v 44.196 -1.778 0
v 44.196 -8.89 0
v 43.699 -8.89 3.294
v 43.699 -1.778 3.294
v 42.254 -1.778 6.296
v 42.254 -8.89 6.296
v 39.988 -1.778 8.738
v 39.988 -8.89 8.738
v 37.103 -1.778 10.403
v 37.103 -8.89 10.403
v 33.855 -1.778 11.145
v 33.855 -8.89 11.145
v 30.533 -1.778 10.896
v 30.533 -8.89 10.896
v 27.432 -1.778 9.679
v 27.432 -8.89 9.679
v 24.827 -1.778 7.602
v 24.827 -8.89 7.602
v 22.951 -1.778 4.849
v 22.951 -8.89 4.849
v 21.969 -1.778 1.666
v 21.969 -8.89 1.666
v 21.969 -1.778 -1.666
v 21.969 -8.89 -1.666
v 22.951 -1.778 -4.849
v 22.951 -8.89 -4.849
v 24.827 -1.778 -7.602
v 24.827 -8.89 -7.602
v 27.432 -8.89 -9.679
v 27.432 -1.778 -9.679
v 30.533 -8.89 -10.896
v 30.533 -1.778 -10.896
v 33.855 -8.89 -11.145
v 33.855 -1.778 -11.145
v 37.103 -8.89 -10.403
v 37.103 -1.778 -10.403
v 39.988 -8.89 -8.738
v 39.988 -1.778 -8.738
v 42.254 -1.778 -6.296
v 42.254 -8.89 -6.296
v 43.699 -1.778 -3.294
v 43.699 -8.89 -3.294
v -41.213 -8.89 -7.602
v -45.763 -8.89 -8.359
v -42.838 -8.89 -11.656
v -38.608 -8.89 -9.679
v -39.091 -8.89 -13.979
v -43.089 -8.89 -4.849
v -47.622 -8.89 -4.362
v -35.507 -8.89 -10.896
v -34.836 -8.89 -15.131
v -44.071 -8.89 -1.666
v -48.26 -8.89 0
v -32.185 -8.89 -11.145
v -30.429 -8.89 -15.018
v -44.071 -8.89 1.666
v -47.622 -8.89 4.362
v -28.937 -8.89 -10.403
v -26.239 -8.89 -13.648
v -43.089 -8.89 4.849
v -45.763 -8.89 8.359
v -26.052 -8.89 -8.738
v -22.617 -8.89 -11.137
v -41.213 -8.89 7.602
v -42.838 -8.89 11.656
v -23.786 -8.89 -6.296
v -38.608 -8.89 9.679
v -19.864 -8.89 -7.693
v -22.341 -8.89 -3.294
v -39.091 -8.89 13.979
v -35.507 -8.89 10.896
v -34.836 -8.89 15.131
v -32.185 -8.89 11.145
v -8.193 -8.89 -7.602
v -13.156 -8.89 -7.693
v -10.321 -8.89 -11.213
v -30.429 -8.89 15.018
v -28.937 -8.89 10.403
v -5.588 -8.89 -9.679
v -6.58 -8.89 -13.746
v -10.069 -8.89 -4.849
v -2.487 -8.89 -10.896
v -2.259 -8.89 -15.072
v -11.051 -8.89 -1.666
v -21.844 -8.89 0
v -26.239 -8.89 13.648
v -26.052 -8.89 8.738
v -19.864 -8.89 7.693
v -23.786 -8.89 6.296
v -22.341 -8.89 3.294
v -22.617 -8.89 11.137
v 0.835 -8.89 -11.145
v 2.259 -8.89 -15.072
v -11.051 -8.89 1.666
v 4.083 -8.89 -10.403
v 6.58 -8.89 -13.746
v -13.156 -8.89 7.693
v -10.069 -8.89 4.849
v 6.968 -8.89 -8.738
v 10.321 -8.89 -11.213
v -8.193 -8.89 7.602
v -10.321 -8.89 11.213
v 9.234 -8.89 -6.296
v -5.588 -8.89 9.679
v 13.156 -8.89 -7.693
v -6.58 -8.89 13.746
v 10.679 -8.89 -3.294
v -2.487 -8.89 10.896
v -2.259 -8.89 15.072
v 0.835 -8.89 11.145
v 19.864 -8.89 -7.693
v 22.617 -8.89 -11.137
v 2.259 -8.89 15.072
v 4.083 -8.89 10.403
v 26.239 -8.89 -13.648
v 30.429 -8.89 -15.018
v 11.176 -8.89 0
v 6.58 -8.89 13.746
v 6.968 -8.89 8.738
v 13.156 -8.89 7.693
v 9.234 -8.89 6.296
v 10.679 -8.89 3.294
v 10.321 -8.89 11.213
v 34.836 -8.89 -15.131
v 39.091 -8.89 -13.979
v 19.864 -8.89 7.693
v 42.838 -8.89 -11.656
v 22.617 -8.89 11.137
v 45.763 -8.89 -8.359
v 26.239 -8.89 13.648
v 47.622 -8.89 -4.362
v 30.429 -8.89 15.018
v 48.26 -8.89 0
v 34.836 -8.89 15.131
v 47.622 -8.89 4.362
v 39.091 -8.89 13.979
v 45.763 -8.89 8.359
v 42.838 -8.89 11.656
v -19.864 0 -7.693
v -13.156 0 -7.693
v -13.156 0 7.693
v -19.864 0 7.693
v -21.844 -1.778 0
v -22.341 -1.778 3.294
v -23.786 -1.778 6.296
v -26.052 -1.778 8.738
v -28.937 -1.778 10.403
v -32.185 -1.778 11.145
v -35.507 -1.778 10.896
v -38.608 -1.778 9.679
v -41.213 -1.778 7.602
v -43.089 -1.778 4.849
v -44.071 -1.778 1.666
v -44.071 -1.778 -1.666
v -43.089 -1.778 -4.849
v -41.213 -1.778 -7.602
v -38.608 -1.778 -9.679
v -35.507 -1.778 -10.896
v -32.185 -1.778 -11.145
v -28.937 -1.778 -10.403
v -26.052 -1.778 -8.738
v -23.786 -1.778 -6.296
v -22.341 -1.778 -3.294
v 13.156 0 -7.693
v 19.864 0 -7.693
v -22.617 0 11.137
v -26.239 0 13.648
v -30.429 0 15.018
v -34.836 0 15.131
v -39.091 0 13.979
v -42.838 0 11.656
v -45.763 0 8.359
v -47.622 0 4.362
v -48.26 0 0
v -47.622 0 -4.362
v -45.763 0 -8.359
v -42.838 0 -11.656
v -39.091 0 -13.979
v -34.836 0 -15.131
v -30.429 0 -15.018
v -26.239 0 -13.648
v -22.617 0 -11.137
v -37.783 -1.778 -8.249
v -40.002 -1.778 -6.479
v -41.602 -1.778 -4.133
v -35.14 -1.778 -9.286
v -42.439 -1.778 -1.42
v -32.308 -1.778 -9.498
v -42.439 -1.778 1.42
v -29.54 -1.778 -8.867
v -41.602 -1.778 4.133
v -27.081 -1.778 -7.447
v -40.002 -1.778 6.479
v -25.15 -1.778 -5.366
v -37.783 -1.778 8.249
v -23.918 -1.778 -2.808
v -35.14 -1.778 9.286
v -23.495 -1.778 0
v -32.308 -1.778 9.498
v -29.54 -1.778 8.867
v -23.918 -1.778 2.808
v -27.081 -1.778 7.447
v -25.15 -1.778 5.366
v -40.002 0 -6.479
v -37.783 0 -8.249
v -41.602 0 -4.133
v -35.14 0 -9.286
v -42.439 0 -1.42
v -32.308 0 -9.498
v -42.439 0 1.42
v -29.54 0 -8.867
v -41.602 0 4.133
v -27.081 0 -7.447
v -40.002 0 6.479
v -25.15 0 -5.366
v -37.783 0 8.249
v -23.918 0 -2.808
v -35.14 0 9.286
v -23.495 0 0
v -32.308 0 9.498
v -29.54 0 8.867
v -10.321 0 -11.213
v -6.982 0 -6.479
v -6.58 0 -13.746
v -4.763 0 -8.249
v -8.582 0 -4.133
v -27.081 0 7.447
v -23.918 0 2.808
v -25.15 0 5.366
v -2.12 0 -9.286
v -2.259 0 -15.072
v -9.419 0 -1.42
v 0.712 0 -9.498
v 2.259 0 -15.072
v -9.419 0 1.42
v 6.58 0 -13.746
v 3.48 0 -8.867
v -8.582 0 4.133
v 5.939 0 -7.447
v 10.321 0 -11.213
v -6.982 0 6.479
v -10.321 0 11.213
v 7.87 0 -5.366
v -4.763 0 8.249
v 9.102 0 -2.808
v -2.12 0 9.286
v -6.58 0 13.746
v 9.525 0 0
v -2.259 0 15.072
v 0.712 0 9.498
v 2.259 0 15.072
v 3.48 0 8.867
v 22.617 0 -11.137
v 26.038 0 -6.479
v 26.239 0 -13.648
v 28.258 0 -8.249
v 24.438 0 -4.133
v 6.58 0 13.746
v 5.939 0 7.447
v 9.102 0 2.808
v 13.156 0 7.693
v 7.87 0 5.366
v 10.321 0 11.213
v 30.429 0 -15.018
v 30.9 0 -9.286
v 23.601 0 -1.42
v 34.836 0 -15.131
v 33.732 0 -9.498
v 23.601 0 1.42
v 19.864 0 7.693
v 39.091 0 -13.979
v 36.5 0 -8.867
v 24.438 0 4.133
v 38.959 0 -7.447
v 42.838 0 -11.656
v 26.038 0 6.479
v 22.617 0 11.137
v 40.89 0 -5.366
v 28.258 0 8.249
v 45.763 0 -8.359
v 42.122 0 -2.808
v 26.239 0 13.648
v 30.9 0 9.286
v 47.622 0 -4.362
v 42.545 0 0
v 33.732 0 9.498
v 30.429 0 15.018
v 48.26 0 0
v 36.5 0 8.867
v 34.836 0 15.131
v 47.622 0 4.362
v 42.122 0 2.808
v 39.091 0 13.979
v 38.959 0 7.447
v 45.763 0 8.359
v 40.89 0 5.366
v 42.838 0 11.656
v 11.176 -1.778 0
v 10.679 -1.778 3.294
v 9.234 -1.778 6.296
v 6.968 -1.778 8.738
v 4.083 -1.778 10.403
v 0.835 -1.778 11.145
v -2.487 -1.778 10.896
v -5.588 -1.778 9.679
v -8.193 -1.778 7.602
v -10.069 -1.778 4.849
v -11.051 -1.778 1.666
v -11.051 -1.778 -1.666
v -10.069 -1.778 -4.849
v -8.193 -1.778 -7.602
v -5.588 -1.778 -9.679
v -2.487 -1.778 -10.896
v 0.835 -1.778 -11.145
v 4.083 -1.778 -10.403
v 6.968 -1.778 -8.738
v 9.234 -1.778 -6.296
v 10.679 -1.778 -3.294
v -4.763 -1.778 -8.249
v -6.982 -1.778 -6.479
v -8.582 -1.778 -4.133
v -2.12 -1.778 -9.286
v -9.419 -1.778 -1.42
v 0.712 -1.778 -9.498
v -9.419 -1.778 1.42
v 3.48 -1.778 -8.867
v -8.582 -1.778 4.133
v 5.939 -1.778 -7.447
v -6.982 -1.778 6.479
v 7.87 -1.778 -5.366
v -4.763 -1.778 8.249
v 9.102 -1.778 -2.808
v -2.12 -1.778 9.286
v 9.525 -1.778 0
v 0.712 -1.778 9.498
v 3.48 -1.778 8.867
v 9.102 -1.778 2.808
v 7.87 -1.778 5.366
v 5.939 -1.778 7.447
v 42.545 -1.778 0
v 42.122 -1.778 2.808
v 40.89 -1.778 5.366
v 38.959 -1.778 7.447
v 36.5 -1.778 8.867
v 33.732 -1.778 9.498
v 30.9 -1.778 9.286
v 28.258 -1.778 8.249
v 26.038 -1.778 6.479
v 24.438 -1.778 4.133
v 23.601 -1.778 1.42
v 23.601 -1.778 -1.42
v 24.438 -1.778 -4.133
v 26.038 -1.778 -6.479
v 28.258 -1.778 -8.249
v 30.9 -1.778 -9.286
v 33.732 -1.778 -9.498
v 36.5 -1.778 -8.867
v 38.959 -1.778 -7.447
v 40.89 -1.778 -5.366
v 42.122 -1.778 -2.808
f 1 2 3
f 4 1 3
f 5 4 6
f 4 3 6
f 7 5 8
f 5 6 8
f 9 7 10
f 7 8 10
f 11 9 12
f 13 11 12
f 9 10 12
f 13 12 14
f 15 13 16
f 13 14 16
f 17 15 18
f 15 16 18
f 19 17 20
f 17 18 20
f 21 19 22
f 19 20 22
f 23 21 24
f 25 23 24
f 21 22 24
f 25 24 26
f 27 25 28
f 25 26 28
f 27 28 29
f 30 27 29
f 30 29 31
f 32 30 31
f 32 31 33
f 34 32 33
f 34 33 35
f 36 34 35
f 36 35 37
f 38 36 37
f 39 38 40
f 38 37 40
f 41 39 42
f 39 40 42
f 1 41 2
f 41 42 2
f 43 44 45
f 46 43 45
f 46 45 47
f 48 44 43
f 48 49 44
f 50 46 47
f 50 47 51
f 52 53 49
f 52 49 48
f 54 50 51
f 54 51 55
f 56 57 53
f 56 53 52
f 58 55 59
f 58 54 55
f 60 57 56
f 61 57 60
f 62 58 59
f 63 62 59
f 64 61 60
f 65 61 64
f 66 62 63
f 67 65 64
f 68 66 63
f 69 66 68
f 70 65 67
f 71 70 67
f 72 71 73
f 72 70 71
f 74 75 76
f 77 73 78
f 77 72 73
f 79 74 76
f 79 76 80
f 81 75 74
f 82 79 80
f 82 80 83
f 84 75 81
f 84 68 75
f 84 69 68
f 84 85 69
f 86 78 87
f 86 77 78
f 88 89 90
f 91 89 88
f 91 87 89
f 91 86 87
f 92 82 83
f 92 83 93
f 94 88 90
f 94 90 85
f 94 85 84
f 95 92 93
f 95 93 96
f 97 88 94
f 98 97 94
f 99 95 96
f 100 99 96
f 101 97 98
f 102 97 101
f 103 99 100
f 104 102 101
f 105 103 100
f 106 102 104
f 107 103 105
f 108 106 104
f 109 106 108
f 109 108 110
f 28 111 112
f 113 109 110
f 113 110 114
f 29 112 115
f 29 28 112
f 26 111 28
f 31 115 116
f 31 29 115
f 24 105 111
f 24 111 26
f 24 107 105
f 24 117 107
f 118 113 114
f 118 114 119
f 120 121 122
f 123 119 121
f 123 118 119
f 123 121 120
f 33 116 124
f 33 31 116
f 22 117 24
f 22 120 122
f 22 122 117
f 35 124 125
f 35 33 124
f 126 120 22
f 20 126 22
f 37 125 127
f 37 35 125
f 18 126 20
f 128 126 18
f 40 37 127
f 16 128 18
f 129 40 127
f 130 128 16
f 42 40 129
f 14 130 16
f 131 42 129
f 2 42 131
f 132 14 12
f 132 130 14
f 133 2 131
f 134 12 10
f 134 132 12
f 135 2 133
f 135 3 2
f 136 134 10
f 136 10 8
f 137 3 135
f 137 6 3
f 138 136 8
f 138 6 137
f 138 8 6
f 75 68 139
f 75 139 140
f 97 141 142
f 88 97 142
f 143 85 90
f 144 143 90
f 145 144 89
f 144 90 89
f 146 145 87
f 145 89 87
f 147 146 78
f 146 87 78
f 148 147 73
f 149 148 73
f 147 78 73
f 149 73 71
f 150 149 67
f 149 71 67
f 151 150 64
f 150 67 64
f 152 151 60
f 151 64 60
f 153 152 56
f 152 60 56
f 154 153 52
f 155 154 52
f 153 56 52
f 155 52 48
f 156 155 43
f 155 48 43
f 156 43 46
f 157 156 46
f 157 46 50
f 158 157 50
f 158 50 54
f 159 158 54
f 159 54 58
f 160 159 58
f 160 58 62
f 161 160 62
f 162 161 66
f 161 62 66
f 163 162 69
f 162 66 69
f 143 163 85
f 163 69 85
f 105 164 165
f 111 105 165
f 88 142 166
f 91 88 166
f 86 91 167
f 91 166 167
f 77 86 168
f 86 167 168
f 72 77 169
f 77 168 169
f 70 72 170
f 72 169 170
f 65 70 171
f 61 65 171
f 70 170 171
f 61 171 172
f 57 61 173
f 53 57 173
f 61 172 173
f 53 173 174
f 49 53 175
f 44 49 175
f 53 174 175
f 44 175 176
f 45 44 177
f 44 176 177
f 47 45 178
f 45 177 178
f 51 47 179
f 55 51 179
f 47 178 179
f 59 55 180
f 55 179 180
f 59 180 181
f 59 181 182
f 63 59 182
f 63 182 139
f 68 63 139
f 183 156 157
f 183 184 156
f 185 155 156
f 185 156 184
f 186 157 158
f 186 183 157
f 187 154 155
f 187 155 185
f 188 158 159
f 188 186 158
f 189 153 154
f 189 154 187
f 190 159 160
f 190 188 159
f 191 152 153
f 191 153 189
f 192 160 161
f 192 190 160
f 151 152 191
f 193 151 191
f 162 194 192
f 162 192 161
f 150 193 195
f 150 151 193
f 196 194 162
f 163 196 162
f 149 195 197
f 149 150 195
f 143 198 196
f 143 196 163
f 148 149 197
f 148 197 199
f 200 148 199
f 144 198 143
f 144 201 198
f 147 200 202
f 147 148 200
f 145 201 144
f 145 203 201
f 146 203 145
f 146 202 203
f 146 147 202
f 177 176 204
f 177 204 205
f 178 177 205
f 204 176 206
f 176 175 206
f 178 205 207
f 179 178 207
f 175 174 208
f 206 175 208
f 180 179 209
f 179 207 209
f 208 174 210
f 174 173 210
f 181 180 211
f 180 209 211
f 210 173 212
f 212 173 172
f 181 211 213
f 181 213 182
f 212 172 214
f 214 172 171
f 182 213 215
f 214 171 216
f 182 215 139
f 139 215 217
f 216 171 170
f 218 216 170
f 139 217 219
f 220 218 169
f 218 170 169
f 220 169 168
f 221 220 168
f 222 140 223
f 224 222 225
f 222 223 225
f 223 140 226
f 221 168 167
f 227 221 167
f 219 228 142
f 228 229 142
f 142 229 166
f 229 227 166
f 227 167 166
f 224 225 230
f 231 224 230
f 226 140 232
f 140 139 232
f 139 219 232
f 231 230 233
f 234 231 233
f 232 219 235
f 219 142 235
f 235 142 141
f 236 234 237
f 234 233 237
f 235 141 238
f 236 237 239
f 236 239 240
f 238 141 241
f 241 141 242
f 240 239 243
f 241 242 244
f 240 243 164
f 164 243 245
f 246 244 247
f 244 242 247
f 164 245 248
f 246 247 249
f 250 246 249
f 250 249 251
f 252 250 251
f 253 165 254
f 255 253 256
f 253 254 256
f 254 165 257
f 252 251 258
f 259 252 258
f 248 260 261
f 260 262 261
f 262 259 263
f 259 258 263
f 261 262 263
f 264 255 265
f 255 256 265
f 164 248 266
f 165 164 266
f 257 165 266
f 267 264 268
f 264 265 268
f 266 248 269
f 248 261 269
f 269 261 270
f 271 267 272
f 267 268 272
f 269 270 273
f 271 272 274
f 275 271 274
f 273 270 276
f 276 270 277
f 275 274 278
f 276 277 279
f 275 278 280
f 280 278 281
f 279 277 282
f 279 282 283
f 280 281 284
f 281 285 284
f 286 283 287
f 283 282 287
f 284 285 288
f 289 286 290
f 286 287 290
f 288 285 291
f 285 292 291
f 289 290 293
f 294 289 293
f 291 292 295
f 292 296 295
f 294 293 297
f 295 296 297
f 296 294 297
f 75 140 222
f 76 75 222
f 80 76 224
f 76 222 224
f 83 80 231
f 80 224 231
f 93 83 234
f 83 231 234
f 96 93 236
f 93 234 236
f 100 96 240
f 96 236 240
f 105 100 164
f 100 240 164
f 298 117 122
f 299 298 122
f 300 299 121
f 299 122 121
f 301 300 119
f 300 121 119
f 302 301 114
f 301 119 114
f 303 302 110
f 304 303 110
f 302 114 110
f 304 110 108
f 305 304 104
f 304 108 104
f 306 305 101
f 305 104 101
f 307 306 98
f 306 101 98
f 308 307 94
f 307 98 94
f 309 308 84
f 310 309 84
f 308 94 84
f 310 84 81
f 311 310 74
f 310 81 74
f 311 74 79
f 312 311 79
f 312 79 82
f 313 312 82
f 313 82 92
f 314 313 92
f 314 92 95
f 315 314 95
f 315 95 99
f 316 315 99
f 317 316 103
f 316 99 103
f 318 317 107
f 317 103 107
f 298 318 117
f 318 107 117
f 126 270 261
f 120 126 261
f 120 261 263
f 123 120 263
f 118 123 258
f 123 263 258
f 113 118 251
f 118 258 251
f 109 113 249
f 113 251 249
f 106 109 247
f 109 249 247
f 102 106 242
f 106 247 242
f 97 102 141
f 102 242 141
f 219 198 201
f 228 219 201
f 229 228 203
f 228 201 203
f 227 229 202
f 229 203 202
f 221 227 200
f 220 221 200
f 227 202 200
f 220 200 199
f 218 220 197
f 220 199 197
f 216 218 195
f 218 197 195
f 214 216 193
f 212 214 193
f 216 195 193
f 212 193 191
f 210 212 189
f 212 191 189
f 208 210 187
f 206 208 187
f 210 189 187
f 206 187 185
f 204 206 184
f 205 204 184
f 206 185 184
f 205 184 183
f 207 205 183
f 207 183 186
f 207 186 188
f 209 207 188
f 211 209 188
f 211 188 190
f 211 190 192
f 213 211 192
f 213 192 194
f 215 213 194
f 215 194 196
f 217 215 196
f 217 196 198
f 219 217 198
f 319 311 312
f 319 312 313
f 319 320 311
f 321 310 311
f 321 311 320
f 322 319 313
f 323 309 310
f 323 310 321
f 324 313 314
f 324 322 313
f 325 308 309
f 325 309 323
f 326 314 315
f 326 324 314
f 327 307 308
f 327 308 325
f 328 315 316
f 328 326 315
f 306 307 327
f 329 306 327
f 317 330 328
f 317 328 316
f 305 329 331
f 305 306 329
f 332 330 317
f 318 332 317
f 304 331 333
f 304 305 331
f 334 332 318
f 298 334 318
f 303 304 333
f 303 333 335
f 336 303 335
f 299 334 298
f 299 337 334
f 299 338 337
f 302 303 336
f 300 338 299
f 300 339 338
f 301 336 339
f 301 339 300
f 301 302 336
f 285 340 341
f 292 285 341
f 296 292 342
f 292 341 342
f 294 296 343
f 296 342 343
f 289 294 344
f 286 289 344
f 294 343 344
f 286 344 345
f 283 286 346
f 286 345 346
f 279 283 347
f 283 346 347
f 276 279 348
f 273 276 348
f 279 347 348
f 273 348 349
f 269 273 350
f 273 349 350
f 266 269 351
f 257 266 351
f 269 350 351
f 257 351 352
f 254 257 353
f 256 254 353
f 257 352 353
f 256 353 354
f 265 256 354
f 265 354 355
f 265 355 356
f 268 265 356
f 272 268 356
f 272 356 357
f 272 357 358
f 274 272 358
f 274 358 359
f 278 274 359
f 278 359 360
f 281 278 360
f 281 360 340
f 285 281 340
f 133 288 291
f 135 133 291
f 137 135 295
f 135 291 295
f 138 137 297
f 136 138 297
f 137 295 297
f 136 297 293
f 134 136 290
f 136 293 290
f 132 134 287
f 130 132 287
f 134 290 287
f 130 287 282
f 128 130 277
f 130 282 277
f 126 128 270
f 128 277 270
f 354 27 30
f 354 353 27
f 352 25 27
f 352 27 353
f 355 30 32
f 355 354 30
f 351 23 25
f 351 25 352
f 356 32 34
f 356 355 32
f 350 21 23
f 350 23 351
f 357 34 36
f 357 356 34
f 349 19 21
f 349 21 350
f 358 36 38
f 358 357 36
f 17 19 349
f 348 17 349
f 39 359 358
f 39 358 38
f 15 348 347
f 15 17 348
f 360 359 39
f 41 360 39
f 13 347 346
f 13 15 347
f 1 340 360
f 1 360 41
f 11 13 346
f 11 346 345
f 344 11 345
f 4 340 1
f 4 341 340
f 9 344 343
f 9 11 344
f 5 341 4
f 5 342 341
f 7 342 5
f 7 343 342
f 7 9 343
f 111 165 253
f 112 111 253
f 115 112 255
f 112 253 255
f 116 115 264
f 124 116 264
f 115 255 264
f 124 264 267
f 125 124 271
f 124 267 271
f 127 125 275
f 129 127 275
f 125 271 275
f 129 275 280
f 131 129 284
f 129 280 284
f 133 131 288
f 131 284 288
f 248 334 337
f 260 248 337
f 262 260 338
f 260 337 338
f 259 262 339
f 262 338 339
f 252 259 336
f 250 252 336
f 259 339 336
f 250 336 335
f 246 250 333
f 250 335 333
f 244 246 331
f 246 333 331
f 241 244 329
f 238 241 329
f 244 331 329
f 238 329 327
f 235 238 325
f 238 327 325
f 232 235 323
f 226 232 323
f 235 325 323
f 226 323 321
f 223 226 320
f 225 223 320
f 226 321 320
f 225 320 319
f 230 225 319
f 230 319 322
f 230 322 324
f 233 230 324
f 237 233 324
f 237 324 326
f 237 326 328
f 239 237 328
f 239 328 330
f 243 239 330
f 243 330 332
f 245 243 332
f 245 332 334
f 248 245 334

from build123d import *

# Parameters (mm, degrees)
F1_DEPTH = 8.89
F2_R     = 9.525
F3_DEPTH = 9.144
F4_R     = 11.176
F5_DEPTH = 7.112


with BuildPart() as f1:
    # F0 (on Front) → F1 (new body)
    with BuildSketch(Plane.XZ):
        with BuildLine():
            Line((33.02, 7.69326929), (33.02, -7.69326929))
            Line((33.02, -7.69326929), (19.8643469326, -7.69326929))
            ThreePointArc((19.8643469326, -7.69326929), (37.0053134916, -14.7096864812), (48.26, 0))
            ThreePointArc((48.26, 0), (37.0053134916, 14.7096864812), (19.8643469326, 7.69326929))
            Line((19.8643469326, 7.69326929), (33.02, 7.69326929))
        make_face()
        with BuildLine():
            Line((19.8643469326, -7.69326929), (33.02, -7.69326929))
            Line((33.02, -7.69326929), (33.02, 7.69326929))
            Line((33.02, 7.69326929), (19.8643469326, 7.69326929))
            ThreePointArc((19.8643469326, 7.69326929), (17.78, 0), (19.8643469326, -7.69326929))
        make_face()
        with BuildLine():
            Line((13.1556530674, -7.69326929), (19.8643469326, -7.69326929))
            ThreePointArc((19.8643469326, -7.69326929), (17.78, 0), (19.8643469326, 7.69326929))
            Line((19.8643469326, 7.69326929), (13.1556530674, 7.69326929))
            ThreePointArc((13.1556530674, 7.69326929), (14.7096864812, 3.9853134916), (15.24, 0))
            ThreePointArc((15.24, 0), (14.7096864812, -3.9853134916), (13.1556530674, -7.69326929))
        make_face()
        with BuildLine():
            ThreePointArc((-13.1556530674, -7.69326929), (0, -15.24), (13.1556530674, -7.69326929))
            Line((13.1556530674, -7.69326929), (-13.1556530674, -7.69326929))
        make_face()
        with BuildLine():
            Line((-13.1556530674, -7.69326929), (13.1556530674, -7.69326929))
            ThreePointArc((13.1556530674, -7.69326929), (14.7096864812, -3.9853134916), (15.24, 0))
            ThreePointArc((15.24, 0), (14.7096864812, 3.9853134916), (13.1556530674, 7.69326929))
            Line((13.1556530674, 7.69326929), (-13.1556530674, 7.69326929))
            ThreePointArc((-13.1556530674, 7.69326929), (-15.24, 0), (-13.1556530674, -7.69326929))
        make_face()
        with BuildLine():
            Line((-19.8643469326, -7.69326929), (-13.1556530674, -7.69326929))
            ThreePointArc((-13.1556530674, -7.69326929), (-15.24, 0), (-13.1556530674, 7.69326929))
            Line((-13.1556530674, 7.69326929), (-19.8643469326, 7.69326929))
            ThreePointArc((-19.8643469326, 7.69326929), (-18.3103135188, 3.9853134916), (-17.78, 0))
            ThreePointArc((-17.78, 0), (-18.3103135188, -3.9853134916), (-19.8643469326, -7.69326929))
        make_face()
        with BuildLine():
            Line((-13.1556530674, 7.69326929), (13.1556530674, 7.69326929))
            ThreePointArc((13.1556530674, 7.69326929), (0, 15.24), (-13.1556530674, 7.69326929))
        make_face()
        with BuildLine():
            ThreePointArc((-19.8643469326, 7.69326929), (-48.26, 0), (-19.8643469326, -7.69326929))
            Line((-19.8643469326, -7.69326929), (-33.02, -7.69326929))
            Line((-33.02, -7.69326929), (-33.02, 7.69326929))
            Line((-33.02, 7.69326929), (-19.8643469326, 7.69326929))
        make_face()
        with BuildLine():
            Line((-33.02, -7.69326929), (-19.8643469326, -7.69326929))
            ThreePointArc((-19.8643469326, -7.69326929), (-18.3103135188, -3.9853134916), (-17.78, 0))
            ThreePointArc((-17.78, 0), (-18.3103135188, 3.9853134916), (-19.8643469326, 7.69326929))
            Line((-19.8643469326, 7.69326929), (-33.02, 7.69326929))
            Line((-33.02, 7.69326929), (-33.02, -7.69326929))
        make_face()
    extrude(amount=F1_DEPTH)

    # F2 (on face) → F3 (cut)
    with BuildSketch(Plane.XZ.offset(8.89)):
        Circle(F2_R)
        with Locations((33.02, 0)):
            Circle(F2_R)
        with Locations((-33.02, 0)):
            Circle(F2_R)
    extrude(amount=-F3_DEPTH, mode=Mode.SUBTRACT)

    # F4 (on face) → F5 (cut)
    with BuildSketch(Plane.XZ.offset(8.89)):
        Circle(F4_R)
        with Locations((-33.02, 0)):
            Circle(F4_R)
        with Locations((33.02, 0)):
            Circle(F4_R)
    extrude(amount=-F5_DEPTH, mode=Mode.SUBTRACT)


solid = f1.part
